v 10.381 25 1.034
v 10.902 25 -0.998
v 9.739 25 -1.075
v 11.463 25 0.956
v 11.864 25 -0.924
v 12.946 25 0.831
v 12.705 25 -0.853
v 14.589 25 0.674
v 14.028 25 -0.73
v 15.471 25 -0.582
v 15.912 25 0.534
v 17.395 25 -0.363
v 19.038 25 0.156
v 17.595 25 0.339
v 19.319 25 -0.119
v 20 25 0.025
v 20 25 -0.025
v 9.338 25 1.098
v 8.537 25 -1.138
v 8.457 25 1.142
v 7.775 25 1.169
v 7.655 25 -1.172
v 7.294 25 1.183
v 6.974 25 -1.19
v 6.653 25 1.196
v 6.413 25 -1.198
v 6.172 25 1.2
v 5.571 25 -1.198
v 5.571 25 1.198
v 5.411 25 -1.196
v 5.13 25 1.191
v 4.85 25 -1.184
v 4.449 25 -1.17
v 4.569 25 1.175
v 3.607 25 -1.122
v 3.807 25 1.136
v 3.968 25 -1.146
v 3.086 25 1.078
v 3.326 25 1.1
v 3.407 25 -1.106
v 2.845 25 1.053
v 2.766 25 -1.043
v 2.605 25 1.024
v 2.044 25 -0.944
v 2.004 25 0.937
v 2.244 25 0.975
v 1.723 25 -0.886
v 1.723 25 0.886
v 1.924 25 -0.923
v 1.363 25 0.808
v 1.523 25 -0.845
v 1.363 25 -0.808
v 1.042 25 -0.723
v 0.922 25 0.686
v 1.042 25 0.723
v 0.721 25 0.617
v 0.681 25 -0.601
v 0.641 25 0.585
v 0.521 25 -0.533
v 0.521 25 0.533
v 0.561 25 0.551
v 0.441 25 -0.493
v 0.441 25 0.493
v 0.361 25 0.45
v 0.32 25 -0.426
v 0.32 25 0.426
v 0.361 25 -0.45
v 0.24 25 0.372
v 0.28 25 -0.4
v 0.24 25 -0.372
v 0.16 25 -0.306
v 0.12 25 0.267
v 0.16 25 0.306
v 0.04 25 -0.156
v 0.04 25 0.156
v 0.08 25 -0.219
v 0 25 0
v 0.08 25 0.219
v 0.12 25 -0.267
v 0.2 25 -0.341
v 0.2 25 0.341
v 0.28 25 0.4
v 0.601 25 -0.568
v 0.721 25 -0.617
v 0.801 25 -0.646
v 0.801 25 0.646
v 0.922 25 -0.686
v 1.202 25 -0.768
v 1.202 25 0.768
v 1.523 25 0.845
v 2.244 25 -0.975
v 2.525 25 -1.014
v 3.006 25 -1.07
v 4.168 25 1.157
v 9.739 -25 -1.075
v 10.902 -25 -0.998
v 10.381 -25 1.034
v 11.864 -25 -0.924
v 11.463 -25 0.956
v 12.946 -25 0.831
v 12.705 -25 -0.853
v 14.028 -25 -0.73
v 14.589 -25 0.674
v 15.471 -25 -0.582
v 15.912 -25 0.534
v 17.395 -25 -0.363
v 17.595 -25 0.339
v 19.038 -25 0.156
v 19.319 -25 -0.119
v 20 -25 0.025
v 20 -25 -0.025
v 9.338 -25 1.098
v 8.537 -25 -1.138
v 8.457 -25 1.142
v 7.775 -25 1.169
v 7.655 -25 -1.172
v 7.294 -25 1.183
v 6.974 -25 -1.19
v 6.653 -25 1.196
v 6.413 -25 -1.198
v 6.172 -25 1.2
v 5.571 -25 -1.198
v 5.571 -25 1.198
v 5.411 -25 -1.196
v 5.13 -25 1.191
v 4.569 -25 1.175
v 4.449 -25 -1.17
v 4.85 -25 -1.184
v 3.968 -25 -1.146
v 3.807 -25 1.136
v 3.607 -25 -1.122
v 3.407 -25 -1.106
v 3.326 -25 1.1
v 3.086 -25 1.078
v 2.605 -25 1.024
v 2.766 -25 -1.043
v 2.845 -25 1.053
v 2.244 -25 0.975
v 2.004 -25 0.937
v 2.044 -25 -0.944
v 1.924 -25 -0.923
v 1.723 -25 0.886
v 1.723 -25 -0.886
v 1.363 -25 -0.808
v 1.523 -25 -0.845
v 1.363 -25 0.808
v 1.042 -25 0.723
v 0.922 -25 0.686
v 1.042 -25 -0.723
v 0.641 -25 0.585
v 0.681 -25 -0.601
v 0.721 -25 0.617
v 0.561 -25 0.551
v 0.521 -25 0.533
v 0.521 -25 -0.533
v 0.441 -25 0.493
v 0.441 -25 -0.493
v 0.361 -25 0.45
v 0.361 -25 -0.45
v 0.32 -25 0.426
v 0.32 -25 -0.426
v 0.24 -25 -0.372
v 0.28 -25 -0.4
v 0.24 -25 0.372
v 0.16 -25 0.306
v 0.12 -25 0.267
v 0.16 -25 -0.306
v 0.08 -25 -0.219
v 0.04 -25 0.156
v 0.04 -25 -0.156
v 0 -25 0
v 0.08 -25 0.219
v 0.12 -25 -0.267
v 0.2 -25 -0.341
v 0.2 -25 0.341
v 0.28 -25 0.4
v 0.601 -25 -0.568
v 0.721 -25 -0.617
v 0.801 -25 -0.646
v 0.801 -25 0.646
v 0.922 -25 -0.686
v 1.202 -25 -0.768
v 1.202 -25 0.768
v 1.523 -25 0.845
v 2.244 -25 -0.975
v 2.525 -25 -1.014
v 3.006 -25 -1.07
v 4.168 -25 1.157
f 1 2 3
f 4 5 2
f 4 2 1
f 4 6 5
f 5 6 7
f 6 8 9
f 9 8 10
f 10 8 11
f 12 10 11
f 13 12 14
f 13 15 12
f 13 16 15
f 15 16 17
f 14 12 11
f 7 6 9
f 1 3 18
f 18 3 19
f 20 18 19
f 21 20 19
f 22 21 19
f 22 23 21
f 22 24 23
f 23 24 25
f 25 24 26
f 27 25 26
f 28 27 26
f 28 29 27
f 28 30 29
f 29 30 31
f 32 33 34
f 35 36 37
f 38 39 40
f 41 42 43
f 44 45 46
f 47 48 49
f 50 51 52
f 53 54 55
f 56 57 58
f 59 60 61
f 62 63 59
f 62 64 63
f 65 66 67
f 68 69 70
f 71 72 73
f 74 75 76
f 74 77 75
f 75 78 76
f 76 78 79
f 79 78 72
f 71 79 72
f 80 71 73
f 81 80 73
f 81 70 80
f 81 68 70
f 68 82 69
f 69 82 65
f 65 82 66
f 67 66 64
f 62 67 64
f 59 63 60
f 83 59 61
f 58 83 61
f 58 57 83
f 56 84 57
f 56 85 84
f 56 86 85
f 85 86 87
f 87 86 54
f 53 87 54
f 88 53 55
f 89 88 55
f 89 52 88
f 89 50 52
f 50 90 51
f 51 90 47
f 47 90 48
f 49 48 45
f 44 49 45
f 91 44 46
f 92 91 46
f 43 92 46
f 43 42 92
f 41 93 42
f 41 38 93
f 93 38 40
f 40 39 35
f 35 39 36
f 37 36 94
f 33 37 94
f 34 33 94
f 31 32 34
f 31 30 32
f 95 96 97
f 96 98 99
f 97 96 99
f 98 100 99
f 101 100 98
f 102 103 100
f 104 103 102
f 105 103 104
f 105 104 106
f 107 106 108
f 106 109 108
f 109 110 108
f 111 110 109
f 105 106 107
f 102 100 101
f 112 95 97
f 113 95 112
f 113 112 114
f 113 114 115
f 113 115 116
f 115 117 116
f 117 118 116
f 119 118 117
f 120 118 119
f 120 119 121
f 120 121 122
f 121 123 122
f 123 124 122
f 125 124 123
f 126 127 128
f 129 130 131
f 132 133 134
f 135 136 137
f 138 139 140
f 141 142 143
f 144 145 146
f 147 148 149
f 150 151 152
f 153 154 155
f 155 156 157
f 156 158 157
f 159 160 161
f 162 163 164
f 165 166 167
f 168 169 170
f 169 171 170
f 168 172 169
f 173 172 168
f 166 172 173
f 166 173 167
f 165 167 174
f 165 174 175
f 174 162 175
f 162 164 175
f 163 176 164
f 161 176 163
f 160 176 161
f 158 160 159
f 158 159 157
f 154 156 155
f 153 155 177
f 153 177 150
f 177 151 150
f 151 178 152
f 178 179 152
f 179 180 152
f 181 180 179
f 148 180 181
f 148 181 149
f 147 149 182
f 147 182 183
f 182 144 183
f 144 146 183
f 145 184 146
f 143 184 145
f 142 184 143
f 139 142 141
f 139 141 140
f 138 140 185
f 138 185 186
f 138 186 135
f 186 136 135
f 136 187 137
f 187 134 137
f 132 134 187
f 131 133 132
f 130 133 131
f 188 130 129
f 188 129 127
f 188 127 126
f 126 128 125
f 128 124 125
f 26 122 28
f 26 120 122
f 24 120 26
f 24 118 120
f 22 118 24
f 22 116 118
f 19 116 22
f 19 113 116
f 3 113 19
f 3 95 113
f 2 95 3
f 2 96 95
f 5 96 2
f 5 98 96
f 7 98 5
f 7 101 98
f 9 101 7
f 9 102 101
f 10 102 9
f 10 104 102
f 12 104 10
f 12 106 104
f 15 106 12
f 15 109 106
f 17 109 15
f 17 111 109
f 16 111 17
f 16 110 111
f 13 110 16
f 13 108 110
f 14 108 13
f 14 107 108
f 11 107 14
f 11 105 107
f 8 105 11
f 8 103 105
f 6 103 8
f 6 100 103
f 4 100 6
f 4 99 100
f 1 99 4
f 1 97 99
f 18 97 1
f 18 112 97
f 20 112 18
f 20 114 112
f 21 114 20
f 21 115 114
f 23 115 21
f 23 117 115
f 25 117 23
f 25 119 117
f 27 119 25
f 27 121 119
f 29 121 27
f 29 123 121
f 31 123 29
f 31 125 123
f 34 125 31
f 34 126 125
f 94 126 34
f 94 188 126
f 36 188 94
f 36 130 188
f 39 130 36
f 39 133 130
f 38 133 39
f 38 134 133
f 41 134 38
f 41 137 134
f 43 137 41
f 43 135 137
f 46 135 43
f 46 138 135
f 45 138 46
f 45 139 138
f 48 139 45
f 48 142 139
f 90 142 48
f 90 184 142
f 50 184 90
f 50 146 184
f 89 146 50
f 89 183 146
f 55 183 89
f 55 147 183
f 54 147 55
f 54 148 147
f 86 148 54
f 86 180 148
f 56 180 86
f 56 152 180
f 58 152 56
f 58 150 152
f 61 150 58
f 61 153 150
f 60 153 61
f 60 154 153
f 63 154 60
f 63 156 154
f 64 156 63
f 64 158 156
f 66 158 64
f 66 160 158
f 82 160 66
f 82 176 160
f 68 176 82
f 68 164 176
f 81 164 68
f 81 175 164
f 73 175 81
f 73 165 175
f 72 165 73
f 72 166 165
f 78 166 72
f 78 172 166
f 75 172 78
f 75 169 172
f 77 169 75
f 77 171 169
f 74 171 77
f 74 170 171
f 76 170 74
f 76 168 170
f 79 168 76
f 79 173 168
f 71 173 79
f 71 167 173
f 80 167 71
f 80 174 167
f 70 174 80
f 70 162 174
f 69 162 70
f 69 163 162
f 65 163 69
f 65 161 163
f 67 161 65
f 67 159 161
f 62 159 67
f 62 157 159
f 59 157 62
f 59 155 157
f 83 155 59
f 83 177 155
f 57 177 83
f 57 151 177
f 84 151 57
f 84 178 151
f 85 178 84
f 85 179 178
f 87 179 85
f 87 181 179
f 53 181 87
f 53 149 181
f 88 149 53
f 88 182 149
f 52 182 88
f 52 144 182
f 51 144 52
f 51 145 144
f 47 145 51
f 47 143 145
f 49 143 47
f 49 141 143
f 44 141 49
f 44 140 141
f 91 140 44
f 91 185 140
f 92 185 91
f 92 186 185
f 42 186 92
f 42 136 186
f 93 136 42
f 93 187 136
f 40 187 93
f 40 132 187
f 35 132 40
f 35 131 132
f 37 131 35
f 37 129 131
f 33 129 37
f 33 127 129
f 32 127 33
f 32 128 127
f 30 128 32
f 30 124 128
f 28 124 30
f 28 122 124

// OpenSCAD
// spoiler_wing

module naca_airfoil(chord=20, t=0.12, n=300) {

function naca_half_thickness(x,t) =5 * t * (0.2969*sqrt(x) - 0.1260*x - 0.3516 * pow(x,2) + 0.2843*pow(x,3) - 0.1015*pow(x,4));

function naca_top_coordinates(t,n) = [for (x=[0:1/(n-1):1]) [x, naca_half_thickness(x,t)]];
    
function naca_bottom_coordinates(t,n) = [ for (x=[1:-1/(n-1):0]) [x, -naca_half_thickness(x,t)]];
    
function naca_coordinates(t,n) = concat(naca_top_coordinates(t,n), naca_bottom_coordinates(t,n));

points = naca_coordinates(t=t,n=n);
scale([chord,chord,1])
    polygon(points);
}

//naca_airfoil(t=0.4,n=500, chord=15);

module naca_wing(span, chord, t, n, center=false) {
    linear_extrude(height=span, center=center)
        naca_airfoil(chord,t,n);
    }
    
rotate([90,0,0])
naca_wing(span=50, chord=20, t=0.12, n= 500, center=true);
